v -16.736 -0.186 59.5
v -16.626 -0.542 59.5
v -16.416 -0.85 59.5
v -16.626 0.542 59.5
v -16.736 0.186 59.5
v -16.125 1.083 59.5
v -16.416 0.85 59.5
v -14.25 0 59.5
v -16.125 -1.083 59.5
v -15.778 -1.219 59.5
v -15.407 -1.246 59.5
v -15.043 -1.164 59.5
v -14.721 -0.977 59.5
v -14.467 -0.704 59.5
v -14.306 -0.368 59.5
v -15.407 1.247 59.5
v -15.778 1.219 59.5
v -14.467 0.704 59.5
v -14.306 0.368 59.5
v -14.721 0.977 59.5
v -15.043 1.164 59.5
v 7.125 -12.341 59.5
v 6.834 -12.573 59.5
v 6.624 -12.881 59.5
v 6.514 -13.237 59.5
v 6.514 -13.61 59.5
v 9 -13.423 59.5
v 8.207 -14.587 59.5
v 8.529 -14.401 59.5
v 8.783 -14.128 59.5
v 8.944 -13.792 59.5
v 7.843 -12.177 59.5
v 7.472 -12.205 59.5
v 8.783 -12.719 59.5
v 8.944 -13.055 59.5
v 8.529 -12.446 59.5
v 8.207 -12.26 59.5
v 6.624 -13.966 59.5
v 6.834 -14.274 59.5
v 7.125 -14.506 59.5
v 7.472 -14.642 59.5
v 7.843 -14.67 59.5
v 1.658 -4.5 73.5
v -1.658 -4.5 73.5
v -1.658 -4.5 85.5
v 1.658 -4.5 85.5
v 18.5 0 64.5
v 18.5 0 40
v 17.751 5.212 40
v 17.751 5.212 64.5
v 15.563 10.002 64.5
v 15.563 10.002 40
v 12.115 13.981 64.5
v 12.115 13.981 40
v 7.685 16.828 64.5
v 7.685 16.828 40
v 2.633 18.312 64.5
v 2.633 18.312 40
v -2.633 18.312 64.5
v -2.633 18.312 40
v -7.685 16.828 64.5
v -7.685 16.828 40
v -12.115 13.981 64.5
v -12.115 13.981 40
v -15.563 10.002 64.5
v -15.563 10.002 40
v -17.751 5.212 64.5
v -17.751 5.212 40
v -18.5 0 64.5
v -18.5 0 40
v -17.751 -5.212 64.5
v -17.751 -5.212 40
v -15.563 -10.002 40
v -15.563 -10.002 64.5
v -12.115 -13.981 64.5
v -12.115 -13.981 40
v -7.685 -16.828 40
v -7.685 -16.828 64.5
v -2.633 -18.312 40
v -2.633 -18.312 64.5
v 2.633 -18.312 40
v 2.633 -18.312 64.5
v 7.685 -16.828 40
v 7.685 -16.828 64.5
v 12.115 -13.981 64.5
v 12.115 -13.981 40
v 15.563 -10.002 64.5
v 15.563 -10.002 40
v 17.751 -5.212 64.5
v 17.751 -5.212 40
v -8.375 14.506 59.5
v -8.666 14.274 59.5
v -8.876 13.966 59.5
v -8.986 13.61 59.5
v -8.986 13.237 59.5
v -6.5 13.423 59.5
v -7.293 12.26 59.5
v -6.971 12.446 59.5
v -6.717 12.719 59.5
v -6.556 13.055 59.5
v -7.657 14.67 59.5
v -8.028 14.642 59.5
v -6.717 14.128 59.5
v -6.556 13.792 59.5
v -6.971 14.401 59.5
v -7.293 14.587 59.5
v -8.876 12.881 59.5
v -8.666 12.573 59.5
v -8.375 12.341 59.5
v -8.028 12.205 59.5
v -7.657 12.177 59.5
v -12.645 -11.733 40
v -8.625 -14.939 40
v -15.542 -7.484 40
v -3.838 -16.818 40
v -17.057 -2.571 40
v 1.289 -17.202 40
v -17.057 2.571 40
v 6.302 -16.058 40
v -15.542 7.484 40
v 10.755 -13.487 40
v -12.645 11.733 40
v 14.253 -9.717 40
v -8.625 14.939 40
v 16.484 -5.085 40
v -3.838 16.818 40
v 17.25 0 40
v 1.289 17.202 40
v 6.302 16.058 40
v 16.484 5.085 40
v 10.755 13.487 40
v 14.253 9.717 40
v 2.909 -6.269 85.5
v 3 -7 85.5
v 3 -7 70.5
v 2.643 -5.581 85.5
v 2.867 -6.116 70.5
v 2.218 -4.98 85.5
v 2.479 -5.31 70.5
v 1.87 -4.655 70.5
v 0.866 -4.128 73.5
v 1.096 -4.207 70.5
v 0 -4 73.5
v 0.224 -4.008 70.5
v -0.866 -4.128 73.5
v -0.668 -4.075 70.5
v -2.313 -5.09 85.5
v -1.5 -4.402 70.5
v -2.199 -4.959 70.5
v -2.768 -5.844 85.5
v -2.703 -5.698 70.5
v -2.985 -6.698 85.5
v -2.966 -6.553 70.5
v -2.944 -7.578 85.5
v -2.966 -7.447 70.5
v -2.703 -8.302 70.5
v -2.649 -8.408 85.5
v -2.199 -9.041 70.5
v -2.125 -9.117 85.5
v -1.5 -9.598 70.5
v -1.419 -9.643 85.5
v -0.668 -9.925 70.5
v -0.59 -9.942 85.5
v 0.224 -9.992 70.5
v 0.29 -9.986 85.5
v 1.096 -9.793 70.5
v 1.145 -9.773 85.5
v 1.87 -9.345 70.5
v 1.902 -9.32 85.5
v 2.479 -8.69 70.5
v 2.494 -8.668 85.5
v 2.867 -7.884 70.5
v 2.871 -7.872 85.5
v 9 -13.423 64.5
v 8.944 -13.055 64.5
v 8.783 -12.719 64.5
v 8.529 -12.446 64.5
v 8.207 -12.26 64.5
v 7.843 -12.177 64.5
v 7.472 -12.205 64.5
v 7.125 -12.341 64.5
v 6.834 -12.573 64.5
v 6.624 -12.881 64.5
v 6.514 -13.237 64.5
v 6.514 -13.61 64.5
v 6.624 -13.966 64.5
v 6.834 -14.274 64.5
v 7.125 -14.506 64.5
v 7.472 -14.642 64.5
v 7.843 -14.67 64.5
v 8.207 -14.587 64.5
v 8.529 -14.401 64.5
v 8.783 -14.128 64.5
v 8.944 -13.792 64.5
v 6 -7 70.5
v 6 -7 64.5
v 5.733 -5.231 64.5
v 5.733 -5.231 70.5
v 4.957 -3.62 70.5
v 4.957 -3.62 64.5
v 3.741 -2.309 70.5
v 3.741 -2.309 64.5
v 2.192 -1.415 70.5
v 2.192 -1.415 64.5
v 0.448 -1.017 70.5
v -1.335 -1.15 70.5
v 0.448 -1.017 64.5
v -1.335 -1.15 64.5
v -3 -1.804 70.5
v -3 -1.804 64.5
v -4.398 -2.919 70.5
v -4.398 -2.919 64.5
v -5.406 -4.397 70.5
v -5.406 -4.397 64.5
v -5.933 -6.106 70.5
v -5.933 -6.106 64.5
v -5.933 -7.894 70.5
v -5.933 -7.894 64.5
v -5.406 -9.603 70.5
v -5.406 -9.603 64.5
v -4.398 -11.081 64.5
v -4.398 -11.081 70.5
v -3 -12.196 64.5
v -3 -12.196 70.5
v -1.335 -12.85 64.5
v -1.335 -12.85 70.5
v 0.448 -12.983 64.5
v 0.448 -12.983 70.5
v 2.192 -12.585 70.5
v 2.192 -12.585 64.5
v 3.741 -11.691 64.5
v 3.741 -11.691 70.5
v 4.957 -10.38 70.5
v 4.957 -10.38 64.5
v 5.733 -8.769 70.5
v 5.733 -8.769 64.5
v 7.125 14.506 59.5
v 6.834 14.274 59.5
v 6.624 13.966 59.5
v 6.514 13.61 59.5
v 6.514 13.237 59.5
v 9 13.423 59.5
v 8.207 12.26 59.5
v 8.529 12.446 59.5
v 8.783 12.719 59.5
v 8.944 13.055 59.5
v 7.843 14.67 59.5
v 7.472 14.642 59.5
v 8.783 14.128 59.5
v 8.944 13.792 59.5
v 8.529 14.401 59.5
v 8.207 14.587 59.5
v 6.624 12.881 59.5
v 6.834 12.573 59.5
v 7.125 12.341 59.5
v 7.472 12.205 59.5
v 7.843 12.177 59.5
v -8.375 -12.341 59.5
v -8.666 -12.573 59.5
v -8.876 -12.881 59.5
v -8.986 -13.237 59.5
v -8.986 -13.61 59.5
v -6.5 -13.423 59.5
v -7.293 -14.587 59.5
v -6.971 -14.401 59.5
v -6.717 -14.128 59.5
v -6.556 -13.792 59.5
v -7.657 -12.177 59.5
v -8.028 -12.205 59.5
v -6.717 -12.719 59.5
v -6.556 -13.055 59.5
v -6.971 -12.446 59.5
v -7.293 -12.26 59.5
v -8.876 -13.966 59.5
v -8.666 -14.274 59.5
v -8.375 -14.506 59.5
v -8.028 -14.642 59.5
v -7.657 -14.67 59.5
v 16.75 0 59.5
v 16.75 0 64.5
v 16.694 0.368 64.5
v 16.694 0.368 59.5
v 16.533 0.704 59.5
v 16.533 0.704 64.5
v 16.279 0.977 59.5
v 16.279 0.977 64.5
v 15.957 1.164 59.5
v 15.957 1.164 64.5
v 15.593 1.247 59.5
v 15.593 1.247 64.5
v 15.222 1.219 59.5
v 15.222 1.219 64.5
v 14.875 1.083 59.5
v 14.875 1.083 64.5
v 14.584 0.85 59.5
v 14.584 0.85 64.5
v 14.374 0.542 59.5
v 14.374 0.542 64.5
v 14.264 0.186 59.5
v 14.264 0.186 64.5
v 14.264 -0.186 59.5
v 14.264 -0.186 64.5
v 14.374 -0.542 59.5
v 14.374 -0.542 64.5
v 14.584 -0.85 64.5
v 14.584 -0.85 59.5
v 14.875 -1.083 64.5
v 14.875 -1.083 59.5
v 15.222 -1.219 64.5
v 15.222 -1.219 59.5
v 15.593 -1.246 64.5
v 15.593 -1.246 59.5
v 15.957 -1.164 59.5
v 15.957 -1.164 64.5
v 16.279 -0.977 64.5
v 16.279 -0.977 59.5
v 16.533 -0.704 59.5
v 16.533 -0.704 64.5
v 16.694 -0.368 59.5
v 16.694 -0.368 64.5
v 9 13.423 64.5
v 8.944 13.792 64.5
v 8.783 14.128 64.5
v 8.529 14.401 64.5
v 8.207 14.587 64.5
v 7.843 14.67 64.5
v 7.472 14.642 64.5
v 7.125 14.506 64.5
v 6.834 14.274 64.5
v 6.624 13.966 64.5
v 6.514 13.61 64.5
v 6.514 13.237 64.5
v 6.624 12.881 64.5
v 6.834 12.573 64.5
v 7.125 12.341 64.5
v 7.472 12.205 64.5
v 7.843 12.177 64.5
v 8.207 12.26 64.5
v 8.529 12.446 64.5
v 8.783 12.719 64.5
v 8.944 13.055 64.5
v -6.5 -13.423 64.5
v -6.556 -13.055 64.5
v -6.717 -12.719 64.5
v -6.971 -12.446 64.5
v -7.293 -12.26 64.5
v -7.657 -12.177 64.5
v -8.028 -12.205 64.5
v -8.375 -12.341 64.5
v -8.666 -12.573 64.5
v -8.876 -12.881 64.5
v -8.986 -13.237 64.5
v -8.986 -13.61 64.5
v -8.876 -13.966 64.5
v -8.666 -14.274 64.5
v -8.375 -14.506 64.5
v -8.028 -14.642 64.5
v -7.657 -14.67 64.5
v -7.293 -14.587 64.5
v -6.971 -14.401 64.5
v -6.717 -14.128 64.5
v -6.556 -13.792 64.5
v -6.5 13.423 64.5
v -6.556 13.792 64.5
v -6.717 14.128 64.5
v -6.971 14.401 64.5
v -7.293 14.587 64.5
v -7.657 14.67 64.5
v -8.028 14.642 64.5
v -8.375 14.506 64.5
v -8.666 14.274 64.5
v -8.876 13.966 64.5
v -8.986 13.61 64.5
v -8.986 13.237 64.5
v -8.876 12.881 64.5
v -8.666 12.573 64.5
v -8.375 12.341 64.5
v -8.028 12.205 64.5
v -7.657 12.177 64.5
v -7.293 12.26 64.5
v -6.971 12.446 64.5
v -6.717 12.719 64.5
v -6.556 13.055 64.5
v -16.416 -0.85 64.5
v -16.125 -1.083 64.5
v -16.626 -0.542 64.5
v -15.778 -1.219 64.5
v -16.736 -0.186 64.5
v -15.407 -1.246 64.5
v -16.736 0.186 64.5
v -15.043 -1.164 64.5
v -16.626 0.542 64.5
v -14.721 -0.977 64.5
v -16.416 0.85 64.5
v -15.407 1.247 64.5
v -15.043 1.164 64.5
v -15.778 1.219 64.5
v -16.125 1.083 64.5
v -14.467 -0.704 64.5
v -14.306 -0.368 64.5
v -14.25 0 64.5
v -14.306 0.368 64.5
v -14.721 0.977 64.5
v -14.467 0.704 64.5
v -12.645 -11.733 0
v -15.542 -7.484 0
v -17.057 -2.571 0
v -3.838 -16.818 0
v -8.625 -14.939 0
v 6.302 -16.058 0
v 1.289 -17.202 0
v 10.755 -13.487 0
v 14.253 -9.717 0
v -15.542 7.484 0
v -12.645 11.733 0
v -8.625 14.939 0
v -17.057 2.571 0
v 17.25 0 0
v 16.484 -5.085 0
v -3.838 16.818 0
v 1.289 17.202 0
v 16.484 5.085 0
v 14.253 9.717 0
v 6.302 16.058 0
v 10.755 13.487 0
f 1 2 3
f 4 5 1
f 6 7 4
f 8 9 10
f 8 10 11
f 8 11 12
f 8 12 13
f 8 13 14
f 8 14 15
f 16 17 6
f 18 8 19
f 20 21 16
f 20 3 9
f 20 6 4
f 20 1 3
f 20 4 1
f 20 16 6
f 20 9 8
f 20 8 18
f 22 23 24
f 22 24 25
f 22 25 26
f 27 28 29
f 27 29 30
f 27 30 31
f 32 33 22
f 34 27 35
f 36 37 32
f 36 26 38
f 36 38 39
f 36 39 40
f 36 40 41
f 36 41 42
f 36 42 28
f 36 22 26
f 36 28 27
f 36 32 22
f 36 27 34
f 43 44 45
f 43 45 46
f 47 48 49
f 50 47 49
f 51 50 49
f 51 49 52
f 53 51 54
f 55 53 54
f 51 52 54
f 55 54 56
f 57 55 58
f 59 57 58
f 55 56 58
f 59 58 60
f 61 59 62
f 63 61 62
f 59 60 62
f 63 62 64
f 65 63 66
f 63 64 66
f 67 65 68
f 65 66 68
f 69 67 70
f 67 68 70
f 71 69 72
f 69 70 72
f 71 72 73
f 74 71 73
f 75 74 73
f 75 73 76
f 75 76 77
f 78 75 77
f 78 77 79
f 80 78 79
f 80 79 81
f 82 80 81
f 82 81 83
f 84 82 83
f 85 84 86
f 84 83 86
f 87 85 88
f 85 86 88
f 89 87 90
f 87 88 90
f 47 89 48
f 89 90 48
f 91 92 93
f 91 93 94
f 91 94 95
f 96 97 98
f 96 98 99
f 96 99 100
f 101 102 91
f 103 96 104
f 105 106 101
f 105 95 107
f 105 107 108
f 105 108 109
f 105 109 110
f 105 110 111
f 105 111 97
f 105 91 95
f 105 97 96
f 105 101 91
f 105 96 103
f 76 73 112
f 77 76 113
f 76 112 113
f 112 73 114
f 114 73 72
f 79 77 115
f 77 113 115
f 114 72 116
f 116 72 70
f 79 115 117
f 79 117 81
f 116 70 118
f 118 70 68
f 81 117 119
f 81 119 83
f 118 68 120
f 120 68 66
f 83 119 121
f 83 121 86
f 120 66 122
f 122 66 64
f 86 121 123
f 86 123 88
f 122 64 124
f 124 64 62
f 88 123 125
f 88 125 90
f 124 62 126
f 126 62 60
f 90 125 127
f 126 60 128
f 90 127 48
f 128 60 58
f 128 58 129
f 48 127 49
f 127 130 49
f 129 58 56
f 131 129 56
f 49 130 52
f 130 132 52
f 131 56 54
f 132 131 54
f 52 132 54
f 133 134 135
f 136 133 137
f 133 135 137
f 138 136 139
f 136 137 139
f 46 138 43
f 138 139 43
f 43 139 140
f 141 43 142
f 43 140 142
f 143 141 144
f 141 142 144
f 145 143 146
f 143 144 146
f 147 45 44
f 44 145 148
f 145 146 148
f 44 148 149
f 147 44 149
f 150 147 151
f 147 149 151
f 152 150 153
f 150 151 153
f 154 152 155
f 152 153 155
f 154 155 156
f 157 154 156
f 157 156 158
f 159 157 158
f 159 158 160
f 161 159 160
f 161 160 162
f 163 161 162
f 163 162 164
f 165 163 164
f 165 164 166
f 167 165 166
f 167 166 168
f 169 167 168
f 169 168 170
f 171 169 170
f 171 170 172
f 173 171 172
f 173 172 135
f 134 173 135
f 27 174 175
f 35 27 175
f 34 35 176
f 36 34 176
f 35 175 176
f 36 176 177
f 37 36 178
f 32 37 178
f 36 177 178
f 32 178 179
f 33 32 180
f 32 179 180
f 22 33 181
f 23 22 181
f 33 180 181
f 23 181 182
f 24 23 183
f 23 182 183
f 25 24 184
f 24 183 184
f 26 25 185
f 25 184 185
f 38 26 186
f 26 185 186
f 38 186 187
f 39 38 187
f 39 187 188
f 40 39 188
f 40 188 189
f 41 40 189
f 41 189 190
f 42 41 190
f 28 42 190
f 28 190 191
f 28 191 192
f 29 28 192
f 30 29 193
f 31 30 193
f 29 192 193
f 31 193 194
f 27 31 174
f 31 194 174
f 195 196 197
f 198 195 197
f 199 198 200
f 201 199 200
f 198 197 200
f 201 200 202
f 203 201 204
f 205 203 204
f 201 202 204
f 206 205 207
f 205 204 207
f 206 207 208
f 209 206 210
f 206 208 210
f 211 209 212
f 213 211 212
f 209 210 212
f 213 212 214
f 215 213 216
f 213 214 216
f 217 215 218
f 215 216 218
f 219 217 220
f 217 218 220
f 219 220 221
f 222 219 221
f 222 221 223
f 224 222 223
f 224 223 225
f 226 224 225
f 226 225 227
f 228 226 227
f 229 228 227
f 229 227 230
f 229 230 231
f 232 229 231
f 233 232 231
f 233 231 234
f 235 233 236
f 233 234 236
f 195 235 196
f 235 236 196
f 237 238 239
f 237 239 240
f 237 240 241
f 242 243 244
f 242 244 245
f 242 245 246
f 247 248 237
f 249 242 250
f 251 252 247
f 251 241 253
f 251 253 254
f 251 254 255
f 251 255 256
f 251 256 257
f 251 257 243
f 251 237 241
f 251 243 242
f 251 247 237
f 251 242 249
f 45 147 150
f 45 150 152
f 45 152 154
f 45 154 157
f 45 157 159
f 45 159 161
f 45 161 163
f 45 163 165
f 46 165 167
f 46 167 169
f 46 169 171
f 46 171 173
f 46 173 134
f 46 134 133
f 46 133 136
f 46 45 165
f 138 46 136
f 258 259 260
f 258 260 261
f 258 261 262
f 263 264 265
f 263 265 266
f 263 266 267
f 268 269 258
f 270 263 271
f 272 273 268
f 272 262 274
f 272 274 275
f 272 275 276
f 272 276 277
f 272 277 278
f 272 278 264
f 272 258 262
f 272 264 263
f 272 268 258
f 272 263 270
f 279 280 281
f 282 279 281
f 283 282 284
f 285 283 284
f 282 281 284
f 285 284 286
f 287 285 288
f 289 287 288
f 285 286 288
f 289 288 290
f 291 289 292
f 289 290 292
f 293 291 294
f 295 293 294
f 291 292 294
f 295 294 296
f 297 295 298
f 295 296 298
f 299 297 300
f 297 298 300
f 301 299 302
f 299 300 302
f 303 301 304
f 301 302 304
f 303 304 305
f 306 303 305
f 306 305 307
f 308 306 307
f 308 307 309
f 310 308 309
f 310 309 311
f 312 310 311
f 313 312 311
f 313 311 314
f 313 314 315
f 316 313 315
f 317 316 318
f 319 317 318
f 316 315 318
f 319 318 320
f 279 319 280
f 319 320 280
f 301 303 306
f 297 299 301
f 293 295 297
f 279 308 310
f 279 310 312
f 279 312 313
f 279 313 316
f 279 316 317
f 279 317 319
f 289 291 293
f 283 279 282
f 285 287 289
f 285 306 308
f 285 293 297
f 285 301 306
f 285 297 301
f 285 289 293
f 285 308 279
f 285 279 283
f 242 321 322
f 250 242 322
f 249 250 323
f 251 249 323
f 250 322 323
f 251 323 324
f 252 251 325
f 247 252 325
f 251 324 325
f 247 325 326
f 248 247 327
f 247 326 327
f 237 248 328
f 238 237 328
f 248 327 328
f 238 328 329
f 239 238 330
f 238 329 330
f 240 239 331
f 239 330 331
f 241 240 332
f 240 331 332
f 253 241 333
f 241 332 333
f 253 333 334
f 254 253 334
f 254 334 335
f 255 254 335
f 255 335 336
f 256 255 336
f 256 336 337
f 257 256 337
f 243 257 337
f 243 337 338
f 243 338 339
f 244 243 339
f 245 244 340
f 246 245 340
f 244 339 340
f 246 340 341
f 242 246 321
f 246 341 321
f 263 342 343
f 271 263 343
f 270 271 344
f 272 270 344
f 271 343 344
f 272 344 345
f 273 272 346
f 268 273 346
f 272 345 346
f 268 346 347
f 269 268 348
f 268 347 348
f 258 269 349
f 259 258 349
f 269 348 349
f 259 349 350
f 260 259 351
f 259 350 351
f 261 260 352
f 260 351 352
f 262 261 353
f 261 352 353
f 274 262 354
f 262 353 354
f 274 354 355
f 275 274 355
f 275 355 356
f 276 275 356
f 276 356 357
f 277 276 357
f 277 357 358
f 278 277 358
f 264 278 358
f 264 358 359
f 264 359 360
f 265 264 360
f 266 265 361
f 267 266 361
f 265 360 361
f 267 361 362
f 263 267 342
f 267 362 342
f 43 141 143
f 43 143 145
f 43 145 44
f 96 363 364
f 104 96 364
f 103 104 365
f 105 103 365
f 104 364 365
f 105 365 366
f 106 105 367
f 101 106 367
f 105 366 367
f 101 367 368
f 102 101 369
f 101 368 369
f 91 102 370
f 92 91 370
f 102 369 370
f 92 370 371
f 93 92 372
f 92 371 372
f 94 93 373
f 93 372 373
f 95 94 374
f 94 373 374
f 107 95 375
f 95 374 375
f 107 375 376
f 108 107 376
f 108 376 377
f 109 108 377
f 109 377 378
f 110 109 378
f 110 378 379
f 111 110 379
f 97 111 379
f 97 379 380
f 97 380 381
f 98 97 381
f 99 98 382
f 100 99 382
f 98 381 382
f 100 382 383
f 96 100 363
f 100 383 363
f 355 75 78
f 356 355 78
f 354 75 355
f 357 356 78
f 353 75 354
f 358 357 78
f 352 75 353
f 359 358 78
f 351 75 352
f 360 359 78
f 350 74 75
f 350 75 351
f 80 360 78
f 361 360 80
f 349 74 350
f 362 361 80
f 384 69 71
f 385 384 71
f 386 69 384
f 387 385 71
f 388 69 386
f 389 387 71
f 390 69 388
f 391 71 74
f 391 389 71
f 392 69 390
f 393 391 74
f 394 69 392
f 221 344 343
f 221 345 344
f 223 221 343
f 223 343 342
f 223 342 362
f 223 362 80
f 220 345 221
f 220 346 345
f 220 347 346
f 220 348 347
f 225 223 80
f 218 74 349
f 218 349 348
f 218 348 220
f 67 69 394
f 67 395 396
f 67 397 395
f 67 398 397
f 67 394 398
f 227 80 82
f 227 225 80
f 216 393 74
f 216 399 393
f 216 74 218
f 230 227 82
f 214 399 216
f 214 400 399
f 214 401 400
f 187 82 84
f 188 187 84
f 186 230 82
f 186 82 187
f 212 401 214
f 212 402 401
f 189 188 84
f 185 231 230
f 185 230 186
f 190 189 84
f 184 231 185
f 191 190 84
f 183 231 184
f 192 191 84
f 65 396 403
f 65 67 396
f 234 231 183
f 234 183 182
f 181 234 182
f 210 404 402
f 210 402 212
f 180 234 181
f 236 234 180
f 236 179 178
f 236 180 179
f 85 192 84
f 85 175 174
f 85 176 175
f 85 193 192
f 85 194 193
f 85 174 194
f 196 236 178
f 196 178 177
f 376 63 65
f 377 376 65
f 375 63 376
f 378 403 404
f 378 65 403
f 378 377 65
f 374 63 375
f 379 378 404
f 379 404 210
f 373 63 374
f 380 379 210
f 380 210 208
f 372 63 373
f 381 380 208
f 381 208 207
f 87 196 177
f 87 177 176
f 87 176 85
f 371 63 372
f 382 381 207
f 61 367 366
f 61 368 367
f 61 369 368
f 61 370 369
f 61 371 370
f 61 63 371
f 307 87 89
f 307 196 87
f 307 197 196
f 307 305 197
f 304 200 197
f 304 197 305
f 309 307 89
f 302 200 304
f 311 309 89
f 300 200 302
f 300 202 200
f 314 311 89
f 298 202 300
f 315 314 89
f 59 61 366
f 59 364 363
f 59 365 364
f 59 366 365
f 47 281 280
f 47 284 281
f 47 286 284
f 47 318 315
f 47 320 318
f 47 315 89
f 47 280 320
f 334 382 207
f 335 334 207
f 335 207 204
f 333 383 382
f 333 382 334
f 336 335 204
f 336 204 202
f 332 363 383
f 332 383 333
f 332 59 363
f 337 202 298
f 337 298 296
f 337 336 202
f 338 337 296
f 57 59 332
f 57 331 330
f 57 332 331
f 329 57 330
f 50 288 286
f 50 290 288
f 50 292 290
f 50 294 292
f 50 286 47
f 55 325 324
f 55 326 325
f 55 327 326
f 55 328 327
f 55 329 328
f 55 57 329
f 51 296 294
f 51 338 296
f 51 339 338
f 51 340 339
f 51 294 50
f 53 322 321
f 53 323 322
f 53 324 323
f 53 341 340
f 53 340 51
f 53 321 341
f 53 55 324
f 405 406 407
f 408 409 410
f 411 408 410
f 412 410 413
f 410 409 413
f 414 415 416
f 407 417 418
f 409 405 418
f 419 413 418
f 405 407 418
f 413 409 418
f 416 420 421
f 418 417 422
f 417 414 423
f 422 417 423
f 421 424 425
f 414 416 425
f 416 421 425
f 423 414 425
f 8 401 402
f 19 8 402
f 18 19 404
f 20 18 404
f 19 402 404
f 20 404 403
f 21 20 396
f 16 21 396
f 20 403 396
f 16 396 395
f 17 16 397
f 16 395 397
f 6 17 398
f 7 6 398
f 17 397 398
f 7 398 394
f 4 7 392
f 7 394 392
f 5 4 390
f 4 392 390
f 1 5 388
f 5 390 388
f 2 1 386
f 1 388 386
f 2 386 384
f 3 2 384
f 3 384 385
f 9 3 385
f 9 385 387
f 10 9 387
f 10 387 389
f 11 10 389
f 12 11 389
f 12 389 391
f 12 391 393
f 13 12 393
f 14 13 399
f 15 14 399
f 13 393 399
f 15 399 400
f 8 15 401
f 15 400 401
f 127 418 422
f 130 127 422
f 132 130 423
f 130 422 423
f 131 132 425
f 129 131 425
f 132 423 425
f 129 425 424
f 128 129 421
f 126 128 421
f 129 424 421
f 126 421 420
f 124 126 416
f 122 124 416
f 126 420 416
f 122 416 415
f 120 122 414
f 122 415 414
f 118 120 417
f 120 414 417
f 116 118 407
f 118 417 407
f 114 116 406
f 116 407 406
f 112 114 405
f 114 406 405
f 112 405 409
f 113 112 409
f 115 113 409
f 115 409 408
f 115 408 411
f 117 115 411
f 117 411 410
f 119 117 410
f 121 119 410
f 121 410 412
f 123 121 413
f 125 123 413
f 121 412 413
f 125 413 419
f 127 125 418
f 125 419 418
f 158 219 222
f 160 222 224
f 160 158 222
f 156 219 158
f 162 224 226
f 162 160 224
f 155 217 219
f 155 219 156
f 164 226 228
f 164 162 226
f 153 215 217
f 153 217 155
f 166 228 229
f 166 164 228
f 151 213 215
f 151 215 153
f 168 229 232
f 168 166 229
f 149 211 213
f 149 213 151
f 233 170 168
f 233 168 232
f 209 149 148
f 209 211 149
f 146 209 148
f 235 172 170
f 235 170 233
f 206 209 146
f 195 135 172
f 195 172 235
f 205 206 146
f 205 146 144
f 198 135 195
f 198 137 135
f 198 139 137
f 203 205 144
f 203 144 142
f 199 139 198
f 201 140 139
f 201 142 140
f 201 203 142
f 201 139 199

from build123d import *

# Parameters (mm, degrees)
SKETCH1_R           = 17.25
BOSS_EXTRUDE1_DEPTH = 40
SKETCH2_R           = 18.5
BOSS_EXTRUDE2_DEPTH = 24.5
SKETCH3_R           = 6
BOSS_EXTRUDE3_DEPTH = 6
SKETCH4_R           = 3
BOSS_EXTRUDE4_DEPTH = 15
CUT_EXTRUDE1_START  = -12
CUT_EXTRUDE1_DEPTH  = 12
SKETCH7_R           = 1.25
CUT_EXTRUDE2_DEPTH  = 5


with BuildPart() as part:
    # Sketch1 → Boss-Extrude1 (new body)
    with BuildSketch(Plane.XY):
        Circle(SKETCH1_R)
    extrude(amount=BOSS_EXTRUDE1_DEPTH)

    # Sketch2 → Boss-Extrude2 (add)
    with BuildSketch(Plane.XY.offset(40)):
        Circle(SKETCH2_R)
    extrude(amount=BOSS_EXTRUDE2_DEPTH)

    # Sketch3 → Boss-Extrude3 (add)
    with BuildSketch(Plane.XY.offset(64.5)):
        with Locations((0, -7)):
            Circle(SKETCH3_R)
    extrude(amount=BOSS_EXTRUDE3_DEPTH)

    # Sketch4 → Boss-Extrude4 (add)
    with BuildSketch(Plane.XY.offset(70.5)):
        with Locations((0, -7)):
            Circle(SKETCH4_R)
    extrude(amount=BOSS_EXTRUDE4_DEPTH)

    # Sketch5 → Cut-Extrude1 (cut)
    with BuildSketch(Plane.XY.offset(85.5).offset(CUT_EXTRUDE1_START)):
        with BuildLine():
            Line((0, -4.5), (1.658312395, -4.5))
            ThreePointArc((1.658312395, -4.5), (0, -4), (-1.658312395, -4.5))
            Line((-1.658312395, -4.5), (0, -4.5))
        make_face()
    extrude(amount=CUT_EXTRUDE1_DEPTH, mode=Mode.SUBTRACT)

    # Sketch7 → Cut-Extrude2 (cut)
    with BuildSketch(Plane.XY.offset(64.5)):
        with Locations((-15.5, 1.1641e-05)):
            Circle(SKETCH7_R)
        with Locations((-7.75, 13.4234054)):
            Circle(SKETCH7_R)
        with Locations((7.75, 13.4234054)):
            Circle(SKETCH7_R)
        with Locations((15.5, 1.1641e-05)):
            Circle(SKETCH7_R)
        with Locations((7.75, -13.423382117)):
            Circle(SKETCH7_R)
        with Locations((-7.75, -13.423382117)):
            Circle(SKETCH7_R)
    extrude(amount=-CUT_EXTRUDE2_DEPTH, mode=Mode.SUBTRACT)


solid = part.part
